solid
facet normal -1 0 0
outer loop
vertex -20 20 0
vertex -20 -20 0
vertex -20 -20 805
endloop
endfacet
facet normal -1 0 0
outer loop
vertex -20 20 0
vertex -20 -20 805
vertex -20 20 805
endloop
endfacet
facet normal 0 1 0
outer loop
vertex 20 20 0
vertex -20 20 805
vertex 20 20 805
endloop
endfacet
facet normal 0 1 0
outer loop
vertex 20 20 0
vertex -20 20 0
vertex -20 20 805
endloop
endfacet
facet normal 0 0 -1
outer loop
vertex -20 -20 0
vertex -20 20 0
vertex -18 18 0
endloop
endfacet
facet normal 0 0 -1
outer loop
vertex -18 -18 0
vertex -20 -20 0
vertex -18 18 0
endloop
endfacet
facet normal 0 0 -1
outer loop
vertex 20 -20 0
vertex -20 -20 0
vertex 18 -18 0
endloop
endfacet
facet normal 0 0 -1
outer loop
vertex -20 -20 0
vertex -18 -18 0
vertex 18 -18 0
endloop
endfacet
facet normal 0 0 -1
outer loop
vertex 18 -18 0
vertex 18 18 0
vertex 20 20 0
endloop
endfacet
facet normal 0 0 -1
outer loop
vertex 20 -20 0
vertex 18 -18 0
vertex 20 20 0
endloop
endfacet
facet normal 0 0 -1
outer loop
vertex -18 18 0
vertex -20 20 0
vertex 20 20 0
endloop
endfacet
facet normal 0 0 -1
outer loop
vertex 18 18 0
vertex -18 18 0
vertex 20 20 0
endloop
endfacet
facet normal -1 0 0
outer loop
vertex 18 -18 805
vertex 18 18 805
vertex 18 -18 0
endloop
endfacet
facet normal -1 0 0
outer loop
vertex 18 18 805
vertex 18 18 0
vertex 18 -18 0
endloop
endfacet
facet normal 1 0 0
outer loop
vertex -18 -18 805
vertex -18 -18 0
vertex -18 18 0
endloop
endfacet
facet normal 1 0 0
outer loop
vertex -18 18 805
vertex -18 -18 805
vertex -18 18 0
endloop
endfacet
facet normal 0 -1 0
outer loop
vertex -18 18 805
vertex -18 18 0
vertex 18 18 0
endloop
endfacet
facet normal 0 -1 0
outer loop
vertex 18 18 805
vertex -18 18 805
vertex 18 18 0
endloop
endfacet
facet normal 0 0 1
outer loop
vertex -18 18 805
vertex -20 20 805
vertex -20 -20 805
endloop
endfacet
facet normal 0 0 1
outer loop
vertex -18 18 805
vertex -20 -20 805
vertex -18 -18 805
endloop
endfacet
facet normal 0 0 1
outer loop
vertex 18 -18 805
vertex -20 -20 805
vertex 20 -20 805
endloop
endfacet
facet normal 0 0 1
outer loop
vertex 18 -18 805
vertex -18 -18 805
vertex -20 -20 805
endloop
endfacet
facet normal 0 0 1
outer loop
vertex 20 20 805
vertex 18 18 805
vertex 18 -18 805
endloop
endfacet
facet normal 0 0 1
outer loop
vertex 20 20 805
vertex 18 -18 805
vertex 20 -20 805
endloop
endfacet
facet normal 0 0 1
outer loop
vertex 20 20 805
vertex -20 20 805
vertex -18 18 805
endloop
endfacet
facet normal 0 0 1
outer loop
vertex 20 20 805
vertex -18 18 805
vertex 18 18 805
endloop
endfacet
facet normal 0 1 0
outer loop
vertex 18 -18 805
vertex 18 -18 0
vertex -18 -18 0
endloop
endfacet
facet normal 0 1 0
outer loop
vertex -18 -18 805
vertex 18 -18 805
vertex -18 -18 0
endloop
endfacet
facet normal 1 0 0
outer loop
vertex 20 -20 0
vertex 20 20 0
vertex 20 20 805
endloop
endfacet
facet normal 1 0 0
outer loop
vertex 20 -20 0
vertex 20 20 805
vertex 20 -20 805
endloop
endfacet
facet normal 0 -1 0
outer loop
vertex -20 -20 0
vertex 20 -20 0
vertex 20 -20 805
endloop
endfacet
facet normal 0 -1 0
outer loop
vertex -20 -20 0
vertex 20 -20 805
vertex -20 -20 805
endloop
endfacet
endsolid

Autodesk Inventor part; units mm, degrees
ref_plane "YZ Plane" through (0, 0, 0) normal (1, 0, 0) x (0, 1, 0)
ref_plane "XZ Plane" through (0, 0, 0) normal (0, 1, 0) x (-1, 0, 0)
ref_plane "XY Plane" through (0, 0, 0) normal (0, 0, 1) x (1, 0, 0)
sketch "Boceto1" plane through (0, 0, 0) normal (0, 0, 1) x (1, 0, 0)
  line L0 (-20, 20) -> (20, 20)
  line L1 (20, 20) -> (20, -20)
  line L2 (20, -20) -> (-20, -20)
  line L3 (-20, -20) -> (-20, 20)
  line L4 (-20, 20) -> (20, -20) construction
  line L5 (-18, 18) -> (18, 18)
  line L6 (18, 18) -> (18, -18)
  line L7 (18, -18) -> (-18, -18)
  line L8 (-18, -18) -> (-18, 18)
  line L9 (-18, 0) -> (-20, 0) construction
  line L10 (0, 18) -> (0, 20) construction
  line L11 (18, 0) -> (20, 0) construction
  line L12 (0, -18) -> (0, -20) construction
  point P0 (0, 0)
  point P1 (0, 0)
  dimension "d0" = 40
  dimension "d1" = 2
extrude "Extrusión1" add sketch "Boceto1" along normal blind 805
properties part number "C_358_40_2"
